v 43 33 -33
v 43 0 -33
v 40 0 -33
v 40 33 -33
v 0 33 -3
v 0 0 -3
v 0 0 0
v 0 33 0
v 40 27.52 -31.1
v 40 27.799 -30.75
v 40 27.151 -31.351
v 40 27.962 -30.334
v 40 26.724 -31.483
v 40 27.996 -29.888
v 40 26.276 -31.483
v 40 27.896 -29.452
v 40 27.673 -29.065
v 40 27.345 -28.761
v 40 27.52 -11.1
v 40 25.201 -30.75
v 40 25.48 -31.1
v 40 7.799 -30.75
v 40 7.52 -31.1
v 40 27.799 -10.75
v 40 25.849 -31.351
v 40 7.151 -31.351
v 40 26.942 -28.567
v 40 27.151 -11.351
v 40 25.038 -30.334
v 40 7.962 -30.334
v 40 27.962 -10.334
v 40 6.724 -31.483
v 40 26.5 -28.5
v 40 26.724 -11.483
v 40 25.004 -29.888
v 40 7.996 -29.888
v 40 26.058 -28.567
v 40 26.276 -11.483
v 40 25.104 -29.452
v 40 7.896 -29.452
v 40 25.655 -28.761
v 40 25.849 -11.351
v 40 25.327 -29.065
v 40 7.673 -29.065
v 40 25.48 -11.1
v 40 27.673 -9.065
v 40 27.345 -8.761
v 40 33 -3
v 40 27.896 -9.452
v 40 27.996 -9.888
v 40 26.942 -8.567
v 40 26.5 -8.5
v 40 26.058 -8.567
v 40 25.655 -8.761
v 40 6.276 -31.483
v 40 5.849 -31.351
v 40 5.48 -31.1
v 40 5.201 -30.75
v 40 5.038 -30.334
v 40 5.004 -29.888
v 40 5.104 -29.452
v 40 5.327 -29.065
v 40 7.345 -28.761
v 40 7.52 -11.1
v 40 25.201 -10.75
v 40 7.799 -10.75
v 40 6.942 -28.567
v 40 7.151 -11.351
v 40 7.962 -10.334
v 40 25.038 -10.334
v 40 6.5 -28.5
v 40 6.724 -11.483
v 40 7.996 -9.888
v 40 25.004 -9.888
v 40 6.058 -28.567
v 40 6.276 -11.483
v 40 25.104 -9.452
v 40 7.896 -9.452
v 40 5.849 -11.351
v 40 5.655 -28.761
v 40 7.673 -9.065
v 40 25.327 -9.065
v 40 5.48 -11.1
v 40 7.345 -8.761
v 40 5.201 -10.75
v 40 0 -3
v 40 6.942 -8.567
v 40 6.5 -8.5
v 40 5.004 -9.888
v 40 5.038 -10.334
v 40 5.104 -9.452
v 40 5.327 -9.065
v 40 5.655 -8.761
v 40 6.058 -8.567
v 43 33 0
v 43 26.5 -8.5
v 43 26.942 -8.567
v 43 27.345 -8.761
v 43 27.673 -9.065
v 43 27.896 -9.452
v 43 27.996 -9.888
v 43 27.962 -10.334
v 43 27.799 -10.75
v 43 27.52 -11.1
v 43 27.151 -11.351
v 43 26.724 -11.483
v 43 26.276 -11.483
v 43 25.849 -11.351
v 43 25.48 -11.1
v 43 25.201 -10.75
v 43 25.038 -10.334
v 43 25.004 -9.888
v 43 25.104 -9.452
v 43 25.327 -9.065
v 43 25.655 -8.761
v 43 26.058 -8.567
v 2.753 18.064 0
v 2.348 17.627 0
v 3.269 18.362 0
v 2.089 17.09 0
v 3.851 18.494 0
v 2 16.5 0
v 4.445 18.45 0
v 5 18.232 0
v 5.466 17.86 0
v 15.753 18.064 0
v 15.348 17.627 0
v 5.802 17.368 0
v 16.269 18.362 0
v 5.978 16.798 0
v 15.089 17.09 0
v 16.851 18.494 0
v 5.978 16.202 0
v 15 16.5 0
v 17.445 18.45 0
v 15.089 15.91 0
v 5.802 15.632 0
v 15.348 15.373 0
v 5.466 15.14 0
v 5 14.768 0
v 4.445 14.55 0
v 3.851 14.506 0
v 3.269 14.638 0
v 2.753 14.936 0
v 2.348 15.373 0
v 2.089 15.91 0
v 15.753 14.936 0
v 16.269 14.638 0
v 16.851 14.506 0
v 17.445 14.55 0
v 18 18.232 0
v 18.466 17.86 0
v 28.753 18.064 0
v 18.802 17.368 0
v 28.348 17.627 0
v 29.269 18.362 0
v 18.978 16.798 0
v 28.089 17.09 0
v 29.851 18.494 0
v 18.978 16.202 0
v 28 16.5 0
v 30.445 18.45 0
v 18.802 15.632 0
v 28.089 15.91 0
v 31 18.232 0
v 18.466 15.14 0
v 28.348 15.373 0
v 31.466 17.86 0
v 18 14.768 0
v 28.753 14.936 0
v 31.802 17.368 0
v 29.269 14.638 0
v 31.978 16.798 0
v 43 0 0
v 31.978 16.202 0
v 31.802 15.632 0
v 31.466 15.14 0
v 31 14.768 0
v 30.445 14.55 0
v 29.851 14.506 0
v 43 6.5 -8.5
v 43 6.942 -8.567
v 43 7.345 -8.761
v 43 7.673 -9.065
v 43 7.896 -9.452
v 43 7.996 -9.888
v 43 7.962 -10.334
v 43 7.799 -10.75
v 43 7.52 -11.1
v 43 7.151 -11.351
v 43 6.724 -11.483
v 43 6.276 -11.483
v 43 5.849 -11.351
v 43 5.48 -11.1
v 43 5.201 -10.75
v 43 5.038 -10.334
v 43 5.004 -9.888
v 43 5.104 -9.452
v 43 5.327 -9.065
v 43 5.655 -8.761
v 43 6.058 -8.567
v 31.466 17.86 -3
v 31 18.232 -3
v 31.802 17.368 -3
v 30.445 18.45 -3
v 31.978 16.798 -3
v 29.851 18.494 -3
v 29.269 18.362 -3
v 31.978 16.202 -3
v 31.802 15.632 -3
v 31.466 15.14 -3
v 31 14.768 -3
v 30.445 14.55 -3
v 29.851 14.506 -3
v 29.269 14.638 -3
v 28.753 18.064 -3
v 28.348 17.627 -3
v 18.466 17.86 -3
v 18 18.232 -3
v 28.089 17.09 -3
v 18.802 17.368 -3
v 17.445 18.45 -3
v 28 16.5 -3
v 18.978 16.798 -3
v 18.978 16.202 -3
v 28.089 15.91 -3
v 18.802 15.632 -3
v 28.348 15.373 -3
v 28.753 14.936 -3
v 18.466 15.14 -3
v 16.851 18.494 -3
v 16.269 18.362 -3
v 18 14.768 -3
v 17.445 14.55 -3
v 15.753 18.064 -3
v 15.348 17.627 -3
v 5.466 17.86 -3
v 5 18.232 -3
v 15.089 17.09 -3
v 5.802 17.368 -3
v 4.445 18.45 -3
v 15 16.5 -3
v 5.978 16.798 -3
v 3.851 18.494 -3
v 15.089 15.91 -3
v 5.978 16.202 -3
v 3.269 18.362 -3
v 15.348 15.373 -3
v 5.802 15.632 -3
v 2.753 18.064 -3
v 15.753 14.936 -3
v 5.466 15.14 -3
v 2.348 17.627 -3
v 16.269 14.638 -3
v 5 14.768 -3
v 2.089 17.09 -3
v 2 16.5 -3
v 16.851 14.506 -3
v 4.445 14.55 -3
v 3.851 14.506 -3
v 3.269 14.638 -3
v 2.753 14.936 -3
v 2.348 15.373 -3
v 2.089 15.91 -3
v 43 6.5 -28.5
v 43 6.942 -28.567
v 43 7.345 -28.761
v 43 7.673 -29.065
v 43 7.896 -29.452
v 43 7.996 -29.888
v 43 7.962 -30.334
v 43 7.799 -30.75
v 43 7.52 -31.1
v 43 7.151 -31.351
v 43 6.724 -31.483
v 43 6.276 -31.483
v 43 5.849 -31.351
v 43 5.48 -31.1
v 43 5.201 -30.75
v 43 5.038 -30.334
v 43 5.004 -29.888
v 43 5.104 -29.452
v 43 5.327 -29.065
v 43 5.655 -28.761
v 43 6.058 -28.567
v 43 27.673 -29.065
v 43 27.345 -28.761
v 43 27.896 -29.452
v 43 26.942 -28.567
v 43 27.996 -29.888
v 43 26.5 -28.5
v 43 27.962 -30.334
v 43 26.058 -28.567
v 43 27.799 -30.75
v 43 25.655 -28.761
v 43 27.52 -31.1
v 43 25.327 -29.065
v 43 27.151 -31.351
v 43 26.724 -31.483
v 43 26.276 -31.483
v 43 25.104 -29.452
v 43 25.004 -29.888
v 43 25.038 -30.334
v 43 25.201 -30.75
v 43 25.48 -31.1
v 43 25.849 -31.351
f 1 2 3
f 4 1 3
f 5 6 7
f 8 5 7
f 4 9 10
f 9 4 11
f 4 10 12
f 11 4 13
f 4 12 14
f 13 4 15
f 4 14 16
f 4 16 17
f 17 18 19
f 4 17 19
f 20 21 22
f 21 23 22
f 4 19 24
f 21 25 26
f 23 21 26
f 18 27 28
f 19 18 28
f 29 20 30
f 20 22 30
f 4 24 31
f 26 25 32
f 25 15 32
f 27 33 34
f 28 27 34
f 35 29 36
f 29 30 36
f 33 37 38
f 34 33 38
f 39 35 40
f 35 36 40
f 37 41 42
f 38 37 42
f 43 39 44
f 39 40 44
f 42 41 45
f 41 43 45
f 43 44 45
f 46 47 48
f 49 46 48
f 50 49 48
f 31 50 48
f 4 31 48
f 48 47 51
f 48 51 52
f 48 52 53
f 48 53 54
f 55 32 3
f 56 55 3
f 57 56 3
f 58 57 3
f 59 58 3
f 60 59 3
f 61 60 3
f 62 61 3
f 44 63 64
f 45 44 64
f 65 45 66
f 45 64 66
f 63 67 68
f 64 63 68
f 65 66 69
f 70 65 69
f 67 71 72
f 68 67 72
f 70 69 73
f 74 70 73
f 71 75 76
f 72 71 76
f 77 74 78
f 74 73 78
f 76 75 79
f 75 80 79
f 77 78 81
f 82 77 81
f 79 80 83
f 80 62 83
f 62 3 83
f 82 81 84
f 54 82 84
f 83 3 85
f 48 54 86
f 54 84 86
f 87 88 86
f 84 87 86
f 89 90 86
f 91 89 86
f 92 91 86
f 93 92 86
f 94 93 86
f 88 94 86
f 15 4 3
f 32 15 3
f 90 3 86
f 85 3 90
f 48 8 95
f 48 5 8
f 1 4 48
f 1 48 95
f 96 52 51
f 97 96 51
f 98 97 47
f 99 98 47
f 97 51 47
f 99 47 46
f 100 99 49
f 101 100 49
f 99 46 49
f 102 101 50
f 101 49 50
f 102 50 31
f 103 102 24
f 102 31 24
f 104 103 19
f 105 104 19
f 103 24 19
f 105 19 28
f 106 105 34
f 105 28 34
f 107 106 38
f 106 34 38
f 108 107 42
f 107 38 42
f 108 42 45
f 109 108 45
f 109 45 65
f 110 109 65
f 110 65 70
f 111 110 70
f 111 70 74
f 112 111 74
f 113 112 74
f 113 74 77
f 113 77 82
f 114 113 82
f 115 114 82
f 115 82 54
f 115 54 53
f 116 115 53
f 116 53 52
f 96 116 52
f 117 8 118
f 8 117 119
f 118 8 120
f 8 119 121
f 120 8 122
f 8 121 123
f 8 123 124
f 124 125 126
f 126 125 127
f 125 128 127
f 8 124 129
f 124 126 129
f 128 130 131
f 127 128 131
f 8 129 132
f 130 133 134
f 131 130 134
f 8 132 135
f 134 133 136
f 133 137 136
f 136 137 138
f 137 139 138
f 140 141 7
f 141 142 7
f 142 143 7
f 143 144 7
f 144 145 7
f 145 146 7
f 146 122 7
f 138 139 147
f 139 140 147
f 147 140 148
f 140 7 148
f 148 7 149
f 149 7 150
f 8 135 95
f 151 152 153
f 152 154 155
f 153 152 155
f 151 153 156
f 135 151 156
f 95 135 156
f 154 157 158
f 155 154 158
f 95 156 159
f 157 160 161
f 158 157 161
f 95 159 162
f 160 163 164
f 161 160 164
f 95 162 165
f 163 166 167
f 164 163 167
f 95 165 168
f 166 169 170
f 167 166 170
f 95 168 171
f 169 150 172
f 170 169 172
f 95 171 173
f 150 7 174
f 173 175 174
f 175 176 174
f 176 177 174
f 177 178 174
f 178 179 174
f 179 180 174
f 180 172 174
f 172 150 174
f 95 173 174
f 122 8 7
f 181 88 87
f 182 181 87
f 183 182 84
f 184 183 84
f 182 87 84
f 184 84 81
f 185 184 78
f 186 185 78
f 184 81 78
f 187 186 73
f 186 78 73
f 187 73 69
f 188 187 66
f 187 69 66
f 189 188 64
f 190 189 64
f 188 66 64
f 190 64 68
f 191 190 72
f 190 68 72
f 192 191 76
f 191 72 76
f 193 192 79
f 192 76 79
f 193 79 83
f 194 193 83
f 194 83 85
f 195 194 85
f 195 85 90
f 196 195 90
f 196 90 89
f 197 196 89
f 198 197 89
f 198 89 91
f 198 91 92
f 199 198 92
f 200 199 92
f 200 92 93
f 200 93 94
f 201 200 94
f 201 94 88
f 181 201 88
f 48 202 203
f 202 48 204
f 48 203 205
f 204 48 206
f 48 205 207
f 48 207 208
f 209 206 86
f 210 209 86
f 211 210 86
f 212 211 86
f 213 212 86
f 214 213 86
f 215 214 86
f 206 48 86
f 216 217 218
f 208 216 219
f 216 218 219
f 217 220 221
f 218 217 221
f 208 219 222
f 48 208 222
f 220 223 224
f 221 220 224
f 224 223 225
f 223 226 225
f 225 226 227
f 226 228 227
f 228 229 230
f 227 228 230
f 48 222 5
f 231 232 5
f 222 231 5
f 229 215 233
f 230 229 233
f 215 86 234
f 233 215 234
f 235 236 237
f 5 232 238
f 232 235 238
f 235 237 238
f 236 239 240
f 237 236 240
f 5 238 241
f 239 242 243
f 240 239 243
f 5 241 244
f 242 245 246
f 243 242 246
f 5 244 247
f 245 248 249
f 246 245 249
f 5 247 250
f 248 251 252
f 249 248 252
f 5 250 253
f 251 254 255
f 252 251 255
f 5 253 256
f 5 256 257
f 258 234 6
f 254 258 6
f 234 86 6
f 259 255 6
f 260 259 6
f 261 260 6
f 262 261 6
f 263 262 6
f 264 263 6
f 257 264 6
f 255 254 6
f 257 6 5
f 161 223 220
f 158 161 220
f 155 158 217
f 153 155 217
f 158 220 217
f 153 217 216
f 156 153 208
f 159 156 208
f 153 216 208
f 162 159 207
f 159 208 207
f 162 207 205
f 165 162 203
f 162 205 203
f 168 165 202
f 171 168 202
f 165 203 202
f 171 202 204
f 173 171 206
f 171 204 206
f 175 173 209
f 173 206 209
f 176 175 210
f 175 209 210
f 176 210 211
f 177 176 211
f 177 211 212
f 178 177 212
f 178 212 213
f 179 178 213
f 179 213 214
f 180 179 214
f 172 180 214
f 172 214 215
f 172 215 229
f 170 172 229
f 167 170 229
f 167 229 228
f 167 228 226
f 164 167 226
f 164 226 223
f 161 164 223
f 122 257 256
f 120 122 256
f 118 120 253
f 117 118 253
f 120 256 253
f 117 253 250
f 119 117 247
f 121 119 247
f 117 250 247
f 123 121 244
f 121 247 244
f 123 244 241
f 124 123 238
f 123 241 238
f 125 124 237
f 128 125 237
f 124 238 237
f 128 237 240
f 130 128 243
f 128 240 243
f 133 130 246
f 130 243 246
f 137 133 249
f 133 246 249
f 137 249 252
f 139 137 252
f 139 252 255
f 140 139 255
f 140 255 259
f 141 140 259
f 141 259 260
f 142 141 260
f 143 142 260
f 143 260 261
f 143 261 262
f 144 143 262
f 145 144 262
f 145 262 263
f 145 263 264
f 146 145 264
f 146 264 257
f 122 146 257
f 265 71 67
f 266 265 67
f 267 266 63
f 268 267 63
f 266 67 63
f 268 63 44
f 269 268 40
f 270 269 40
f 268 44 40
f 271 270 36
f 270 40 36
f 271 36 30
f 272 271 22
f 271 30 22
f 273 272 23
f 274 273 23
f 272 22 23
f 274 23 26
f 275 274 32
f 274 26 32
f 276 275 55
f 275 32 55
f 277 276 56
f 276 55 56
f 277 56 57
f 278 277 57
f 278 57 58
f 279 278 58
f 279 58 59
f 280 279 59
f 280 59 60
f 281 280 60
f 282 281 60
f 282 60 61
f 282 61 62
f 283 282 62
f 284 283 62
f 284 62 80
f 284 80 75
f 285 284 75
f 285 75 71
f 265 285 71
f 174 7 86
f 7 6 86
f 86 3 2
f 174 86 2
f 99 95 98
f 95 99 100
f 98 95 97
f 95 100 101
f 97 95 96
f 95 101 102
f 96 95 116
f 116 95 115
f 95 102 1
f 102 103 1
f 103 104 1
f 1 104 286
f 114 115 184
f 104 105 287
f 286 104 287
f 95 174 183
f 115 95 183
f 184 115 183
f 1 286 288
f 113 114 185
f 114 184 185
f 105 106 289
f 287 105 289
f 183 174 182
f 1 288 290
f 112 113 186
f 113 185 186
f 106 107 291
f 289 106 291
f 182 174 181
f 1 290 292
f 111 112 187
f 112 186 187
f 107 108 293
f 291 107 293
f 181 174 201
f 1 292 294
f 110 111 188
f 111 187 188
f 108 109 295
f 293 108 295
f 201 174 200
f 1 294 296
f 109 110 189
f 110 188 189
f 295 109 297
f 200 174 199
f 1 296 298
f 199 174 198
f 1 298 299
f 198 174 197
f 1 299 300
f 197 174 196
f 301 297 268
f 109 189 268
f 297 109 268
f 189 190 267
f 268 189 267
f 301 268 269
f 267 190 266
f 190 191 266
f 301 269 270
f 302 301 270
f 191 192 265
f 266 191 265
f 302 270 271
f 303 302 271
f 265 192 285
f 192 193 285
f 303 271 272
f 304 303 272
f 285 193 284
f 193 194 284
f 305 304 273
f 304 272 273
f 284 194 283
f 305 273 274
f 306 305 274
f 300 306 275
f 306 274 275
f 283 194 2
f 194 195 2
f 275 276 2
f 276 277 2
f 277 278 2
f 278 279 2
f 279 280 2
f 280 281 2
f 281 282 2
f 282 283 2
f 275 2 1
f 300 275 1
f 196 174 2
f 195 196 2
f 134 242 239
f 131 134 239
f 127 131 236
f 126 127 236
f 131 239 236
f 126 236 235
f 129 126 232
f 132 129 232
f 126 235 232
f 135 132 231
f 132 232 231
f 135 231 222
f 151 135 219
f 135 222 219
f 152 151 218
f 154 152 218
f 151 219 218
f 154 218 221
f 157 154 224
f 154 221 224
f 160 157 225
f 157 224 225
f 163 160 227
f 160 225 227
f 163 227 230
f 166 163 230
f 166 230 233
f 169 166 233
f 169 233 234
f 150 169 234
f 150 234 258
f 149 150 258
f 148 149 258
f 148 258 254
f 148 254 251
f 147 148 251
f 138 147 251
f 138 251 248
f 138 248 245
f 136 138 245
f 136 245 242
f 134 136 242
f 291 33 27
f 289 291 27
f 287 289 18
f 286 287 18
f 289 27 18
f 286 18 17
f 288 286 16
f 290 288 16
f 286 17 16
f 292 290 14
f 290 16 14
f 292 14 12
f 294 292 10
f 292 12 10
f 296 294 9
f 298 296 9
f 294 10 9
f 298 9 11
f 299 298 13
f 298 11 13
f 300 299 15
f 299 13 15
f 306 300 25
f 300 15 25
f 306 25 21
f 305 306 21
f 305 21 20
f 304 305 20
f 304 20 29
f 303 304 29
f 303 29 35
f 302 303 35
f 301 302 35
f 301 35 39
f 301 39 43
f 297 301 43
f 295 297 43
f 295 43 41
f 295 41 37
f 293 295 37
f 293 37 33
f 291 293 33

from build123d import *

# Parameters (mm, degrees)
EXTRUDE_1_DEPTH     = 33
CUT_EXTRUDE_1_REACH = 63.465
SKETCH_2_R          = 1.5
CUT_EXTRUDE_2_REACH = 63.952
SKETCH_3_R          = 2


with BuildPart() as part:
    # 草图1 → 凸台-拉伸1 (new body)
    with BuildSketch(Plane(origin=(0, 0, 0), x_dir=(1, 0, 0), z_dir=(0, 1, 0))):
        Polygon((0, 0), (43, 0), (43, 33), (40, 33), (40, 3), (0, 3), align=None)
    extrude(amount=EXTRUDE_1_DEPTH)

    # 草图2 → 切除-拉伸1 (cut, up to next)
    with BuildSketch(Plane.ZY.offset(-40), mode=Mode.PRIVATE) as cut_extrude_1_sk1:
        with Locations((-30, 6.5)):
            Circle(SKETCH_2_R)
    cut_extrude_1_tool1 = extrude(cut_extrude_1_sk1.sketch, amount=-CUT_EXTRUDE_1_REACH, mode=Mode.PRIVATE) & part.part
    # 草图2 → 切除-拉伸1 (cut, up to next)
    with BuildSketch(Plane.ZY.offset(-40), mode=Mode.PRIVATE) as cut_extrude_1_sk2:
        with Locations((-30, 26.5)):
            Circle(SKETCH_2_R)
    cut_extrude_1_tool2 = extrude(cut_extrude_1_sk2.sketch, amount=-CUT_EXTRUDE_1_REACH, mode=Mode.PRIVATE) & part.part
    # 草图2 → 切除-拉伸1 (cut, up to next)
    with BuildSketch(Plane.ZY.offset(-40), mode=Mode.PRIVATE) as cut_extrude_1_sk3:
        with Locations((-10, 6.5)):
            Circle(SKETCH_2_R)
    cut_extrude_1_tool3 = extrude(cut_extrude_1_sk3.sketch, amount=-CUT_EXTRUDE_1_REACH, mode=Mode.PRIVATE) & part.part
    # 草图2 → 切除-拉伸1 (cut, up to next)
    with BuildSketch(Plane.ZY.offset(-40), mode=Mode.PRIVATE) as cut_extrude_1_sk4:
        with Locations((-10, 26.5)):
            Circle(SKETCH_2_R)
    cut_extrude_1_tool4 = extrude(cut_extrude_1_sk4.sketch, amount=-CUT_EXTRUDE_1_REACH, mode=Mode.PRIVATE) & part.part
    add(cut_extrude_1_tool1.solids().sort_by_distance((40, 6.5, -30))[0], mode=Mode.SUBTRACT)
    add(cut_extrude_1_tool2.solids().sort_by_distance((40, 26.5, -30))[0], mode=Mode.SUBTRACT)
    add(cut_extrude_1_tool3.solids().sort_by_distance((40, 6.5, -10))[0], mode=Mode.SUBTRACT)
    add(cut_extrude_1_tool4.solids().sort_by_distance((40, 26.5, -10))[0], mode=Mode.SUBTRACT)

    # 草图3 → 切除-拉伸2 (cut, up to next)
    with BuildSketch(Plane(origin=(0, 0, -3), x_dir=(-1, 0, 0), z_dir=(0, 0, -1)), mode=Mode.PRIVATE) as cut_extrude_2_sk1:
        with Locations((-4, 16.5)):
            Circle(SKETCH_3_R)
    cut_extrude_2_tool1 = extrude(cut_extrude_2_sk1.sketch, amount=-CUT_EXTRUDE_2_REACH, mode=Mode.PRIVATE) & part.part
    # 草图3 → 切除-拉伸2 (cut, up to next)
    with BuildSketch(Plane(origin=(0, 0, -3), x_dir=(-1, 0, 0), z_dir=(0, 0, -1)), mode=Mode.PRIVATE) as cut_extrude_2_sk2:
        with Locations((-30, 16.5)):
            Circle(SKETCH_3_R)
    cut_extrude_2_tool2 = extrude(cut_extrude_2_sk2.sketch, amount=-CUT_EXTRUDE_2_REACH, mode=Mode.PRIVATE) & part.part
    # 草图3 → 切除-拉伸2 (cut, up to next)
    with BuildSketch(Plane(origin=(0, 0, -3), x_dir=(-1, 0, 0), z_dir=(0, 0, -1)), mode=Mode.PRIVATE) as cut_extrude_2_sk3:
        with Locations((-17, 16.5)):
            Circle(SKETCH_3_R)
    cut_extrude_2_tool3 = extrude(cut_extrude_2_sk3.sketch, amount=-CUT_EXTRUDE_2_REACH, mode=Mode.PRIVATE) & part.part
    add(cut_extrude_2_tool1.solids().sort_by_distance((4, 16.5, -3))[0], mode=Mode.SUBTRACT)
    add(cut_extrude_2_tool2.solids().sort_by_distance((30, 16.5, -3))[0], mode=Mode.SUBTRACT)
    add(cut_extrude_2_tool3.solids().sort_by_distance((17, 16.5, -3))[0], mode=Mode.SUBTRACT)


solid = part.part
